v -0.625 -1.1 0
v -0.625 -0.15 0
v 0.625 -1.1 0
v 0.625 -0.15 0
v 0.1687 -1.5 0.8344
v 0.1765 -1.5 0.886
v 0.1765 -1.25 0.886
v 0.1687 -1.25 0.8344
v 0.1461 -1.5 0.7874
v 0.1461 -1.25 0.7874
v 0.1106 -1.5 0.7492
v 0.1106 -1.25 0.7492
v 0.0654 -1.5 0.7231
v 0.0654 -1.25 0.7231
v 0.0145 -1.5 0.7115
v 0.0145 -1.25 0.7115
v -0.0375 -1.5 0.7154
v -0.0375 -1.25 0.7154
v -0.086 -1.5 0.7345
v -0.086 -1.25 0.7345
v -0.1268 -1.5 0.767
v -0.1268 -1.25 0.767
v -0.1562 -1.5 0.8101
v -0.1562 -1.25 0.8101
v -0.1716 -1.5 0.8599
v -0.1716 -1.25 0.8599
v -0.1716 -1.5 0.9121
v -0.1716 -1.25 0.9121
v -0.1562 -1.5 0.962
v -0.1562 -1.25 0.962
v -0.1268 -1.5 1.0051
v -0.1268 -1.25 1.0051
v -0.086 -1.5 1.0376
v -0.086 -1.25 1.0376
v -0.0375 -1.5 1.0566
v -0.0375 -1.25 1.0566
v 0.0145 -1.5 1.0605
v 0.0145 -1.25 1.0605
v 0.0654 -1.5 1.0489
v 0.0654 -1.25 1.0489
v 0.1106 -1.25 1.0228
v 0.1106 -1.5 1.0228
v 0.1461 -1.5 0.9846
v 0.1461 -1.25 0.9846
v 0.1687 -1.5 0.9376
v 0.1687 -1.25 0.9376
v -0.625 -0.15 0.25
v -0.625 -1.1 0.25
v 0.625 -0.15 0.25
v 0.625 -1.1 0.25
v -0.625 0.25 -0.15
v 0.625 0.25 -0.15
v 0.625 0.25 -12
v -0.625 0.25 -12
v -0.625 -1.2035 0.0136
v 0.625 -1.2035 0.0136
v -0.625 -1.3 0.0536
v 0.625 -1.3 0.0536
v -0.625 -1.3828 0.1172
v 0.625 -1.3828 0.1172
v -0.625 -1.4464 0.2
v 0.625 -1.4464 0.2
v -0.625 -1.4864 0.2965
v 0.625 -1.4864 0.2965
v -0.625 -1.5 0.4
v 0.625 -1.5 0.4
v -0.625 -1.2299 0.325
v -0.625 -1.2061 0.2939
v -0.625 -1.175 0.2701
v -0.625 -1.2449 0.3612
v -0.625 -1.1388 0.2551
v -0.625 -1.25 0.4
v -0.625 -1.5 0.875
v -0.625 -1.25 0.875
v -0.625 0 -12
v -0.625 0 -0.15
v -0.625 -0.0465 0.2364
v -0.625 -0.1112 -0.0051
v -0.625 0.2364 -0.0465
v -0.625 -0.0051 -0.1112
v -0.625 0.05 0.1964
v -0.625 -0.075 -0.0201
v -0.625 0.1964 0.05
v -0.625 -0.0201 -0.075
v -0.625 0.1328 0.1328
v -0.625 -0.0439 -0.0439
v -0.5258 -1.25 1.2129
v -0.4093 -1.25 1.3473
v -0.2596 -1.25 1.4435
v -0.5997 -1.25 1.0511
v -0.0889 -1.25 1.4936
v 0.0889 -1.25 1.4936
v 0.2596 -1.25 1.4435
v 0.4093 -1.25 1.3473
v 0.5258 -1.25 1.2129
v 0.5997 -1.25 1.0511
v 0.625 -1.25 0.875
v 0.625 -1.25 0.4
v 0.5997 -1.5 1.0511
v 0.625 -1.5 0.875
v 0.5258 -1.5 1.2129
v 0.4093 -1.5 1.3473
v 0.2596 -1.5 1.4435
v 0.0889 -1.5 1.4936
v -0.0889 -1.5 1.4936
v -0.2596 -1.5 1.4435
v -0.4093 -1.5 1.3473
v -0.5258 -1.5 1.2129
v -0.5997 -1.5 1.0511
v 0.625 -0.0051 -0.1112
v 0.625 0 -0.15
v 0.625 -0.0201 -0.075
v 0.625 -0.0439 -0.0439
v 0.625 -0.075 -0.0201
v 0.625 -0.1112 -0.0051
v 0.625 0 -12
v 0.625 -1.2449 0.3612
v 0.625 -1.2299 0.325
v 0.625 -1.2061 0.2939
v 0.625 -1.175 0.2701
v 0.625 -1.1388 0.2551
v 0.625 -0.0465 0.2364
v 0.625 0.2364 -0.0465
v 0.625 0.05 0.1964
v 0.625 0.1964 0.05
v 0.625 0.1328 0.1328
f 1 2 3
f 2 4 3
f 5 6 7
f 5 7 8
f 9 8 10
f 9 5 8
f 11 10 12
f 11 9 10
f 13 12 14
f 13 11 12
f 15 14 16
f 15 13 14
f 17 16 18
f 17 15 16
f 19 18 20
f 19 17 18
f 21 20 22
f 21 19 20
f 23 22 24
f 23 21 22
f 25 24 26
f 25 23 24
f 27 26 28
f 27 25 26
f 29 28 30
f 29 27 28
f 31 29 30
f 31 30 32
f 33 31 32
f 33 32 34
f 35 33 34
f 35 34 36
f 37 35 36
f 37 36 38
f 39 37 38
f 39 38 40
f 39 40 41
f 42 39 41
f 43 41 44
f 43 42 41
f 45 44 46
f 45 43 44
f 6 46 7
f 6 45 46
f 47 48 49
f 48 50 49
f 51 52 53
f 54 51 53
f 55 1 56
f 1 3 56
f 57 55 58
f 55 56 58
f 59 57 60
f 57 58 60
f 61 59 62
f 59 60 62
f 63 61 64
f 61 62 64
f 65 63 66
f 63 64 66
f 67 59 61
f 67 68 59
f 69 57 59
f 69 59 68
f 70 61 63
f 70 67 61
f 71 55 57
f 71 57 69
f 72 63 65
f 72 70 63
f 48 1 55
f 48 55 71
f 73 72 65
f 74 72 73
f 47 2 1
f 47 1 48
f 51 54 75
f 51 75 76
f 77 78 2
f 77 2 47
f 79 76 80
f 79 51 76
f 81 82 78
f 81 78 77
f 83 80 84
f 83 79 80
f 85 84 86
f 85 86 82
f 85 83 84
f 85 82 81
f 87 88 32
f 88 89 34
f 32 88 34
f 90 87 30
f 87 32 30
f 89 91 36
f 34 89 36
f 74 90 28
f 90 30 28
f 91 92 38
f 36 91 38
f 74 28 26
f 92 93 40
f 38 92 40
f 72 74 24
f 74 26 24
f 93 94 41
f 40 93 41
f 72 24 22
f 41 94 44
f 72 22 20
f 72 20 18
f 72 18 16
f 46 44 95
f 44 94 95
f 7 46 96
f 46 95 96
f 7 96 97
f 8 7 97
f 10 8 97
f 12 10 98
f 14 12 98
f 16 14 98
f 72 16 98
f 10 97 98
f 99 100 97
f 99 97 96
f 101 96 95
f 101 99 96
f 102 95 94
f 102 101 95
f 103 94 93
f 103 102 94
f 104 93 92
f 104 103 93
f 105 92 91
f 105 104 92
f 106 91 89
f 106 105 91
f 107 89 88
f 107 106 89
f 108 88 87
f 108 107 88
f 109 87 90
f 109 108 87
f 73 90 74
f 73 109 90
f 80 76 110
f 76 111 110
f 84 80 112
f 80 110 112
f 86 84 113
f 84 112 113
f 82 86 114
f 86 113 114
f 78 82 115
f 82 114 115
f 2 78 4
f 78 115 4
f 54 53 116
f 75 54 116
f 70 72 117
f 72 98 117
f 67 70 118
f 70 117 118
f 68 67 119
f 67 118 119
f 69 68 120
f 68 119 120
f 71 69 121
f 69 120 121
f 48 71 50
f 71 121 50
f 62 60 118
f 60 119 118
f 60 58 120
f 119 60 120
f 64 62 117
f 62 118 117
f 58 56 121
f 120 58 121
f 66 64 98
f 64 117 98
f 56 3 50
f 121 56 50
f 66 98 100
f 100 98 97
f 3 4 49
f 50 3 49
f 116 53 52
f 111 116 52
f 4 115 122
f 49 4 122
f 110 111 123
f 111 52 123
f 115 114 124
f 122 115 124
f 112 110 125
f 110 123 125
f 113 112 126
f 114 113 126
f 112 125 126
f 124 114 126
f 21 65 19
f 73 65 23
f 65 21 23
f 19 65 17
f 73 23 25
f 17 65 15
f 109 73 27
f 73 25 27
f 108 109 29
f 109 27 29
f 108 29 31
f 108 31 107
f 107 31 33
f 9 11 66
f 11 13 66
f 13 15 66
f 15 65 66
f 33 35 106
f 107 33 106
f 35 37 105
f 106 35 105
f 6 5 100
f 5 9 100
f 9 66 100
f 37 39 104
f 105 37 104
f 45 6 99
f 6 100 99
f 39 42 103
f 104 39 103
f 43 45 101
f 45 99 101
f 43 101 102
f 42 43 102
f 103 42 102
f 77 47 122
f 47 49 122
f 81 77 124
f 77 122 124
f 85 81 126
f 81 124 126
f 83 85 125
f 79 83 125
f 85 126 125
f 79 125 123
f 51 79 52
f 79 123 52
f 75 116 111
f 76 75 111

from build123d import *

# Parameters (mm, degrees)
BASE_FLANGE1_DEPTH = 0.625
FILLET1_RADIUS     = 0.625
FILLET1_LENGTH     = 0.25
HOLE1_START        = -1.5
HOLE1_OUTLINE_R    = 0.175
HOLE1_DEPTH        = 0.25


# Read off the part's stored shape, not the designer's step: Hole1
# Sheet-metal steps are written as plain solids
with BuildPart() as part:
    # Sketch1 → Base-Flange1 (new, symmetric)
    with BuildSketch(Plane(origin=(0, 0, 0), x_dir=(0, 0, -1), z_dir=(1, 0, 0))):
        with BuildLine():
            Line((12, 0), (0.15, 0))
            ThreePointArc((0.15, 0), (0.043933983, -0.043933983), (0, -0.15))
            Line((0, -0.15), (0, -1.1))
            ThreePointArc((0, -1.1), (-0.117157288, -1.382842712), (-0.4, -1.5))
            Line((-0.4, -1.5), (-1.5, -1.5))
            Line((-1.5, -1.5), (-1.5, -1.25))
            Line((-1.5, -1.25), (-0.4, -1.25))
            ThreePointArc((-0.4, -1.25), (-0.293933983, -1.206066017), (-0.25, -1.1))
            Line((-0.25, -1.1), (-0.25, -0.15))
            ThreePointArc((-0.25, -0.15), (-0.132842712, 0.132842712), (0.15, 0.25))
            Line((0.15, 0.25), (12, 0.25))
            Line((12, 0.25), (12, 0))
        make_face()
    extrude(amount=BASE_FLANGE1_DEPTH, both=True)

    # Fillet1: full round fillet: the end face becomes a half cylinder, R = half its width
    fillet1_face = Plane((0, -1.375, 1.5), x_dir=(0, -1, 0), z_dir=(0, 0, 1))  # on the end face: x along it, z out of the body
    fillet1_slab = fillet1_face.offset(-FILLET1_RADIUS / 2) * Box(FILLET1_LENGTH, 2 * FILLET1_RADIUS, FILLET1_RADIUS, mode=Mode.PRIVATE)  # the body's end, R deep
    fillet1_round = Plane((0, -1.375, 0.875), x_dir=(0, 0, 1), z_dir=(0, -1, 0)) * Cylinder(FILLET1_RADIUS, FILLET1_LENGTH, mode=Mode.PRIVATE)  # its axis R under the face
    add(fillet1_slab - fillet1_round, mode=Mode.SUBTRACT)

    # Hole1 outline → Hole1 (cut)
    with BuildSketch(Plane(origin=(0, 0, 0), x_dir=(1, 0, 0), z_dir=(0, 1, 0)).offset(HOLE1_START)):
        with Locations((0.001471382, -0.886025874)):
            Circle(HOLE1_OUTLINE_R)
    extrude(amount=HOLE1_DEPTH, mode=Mode.SUBTRACT)


solid = part.part
